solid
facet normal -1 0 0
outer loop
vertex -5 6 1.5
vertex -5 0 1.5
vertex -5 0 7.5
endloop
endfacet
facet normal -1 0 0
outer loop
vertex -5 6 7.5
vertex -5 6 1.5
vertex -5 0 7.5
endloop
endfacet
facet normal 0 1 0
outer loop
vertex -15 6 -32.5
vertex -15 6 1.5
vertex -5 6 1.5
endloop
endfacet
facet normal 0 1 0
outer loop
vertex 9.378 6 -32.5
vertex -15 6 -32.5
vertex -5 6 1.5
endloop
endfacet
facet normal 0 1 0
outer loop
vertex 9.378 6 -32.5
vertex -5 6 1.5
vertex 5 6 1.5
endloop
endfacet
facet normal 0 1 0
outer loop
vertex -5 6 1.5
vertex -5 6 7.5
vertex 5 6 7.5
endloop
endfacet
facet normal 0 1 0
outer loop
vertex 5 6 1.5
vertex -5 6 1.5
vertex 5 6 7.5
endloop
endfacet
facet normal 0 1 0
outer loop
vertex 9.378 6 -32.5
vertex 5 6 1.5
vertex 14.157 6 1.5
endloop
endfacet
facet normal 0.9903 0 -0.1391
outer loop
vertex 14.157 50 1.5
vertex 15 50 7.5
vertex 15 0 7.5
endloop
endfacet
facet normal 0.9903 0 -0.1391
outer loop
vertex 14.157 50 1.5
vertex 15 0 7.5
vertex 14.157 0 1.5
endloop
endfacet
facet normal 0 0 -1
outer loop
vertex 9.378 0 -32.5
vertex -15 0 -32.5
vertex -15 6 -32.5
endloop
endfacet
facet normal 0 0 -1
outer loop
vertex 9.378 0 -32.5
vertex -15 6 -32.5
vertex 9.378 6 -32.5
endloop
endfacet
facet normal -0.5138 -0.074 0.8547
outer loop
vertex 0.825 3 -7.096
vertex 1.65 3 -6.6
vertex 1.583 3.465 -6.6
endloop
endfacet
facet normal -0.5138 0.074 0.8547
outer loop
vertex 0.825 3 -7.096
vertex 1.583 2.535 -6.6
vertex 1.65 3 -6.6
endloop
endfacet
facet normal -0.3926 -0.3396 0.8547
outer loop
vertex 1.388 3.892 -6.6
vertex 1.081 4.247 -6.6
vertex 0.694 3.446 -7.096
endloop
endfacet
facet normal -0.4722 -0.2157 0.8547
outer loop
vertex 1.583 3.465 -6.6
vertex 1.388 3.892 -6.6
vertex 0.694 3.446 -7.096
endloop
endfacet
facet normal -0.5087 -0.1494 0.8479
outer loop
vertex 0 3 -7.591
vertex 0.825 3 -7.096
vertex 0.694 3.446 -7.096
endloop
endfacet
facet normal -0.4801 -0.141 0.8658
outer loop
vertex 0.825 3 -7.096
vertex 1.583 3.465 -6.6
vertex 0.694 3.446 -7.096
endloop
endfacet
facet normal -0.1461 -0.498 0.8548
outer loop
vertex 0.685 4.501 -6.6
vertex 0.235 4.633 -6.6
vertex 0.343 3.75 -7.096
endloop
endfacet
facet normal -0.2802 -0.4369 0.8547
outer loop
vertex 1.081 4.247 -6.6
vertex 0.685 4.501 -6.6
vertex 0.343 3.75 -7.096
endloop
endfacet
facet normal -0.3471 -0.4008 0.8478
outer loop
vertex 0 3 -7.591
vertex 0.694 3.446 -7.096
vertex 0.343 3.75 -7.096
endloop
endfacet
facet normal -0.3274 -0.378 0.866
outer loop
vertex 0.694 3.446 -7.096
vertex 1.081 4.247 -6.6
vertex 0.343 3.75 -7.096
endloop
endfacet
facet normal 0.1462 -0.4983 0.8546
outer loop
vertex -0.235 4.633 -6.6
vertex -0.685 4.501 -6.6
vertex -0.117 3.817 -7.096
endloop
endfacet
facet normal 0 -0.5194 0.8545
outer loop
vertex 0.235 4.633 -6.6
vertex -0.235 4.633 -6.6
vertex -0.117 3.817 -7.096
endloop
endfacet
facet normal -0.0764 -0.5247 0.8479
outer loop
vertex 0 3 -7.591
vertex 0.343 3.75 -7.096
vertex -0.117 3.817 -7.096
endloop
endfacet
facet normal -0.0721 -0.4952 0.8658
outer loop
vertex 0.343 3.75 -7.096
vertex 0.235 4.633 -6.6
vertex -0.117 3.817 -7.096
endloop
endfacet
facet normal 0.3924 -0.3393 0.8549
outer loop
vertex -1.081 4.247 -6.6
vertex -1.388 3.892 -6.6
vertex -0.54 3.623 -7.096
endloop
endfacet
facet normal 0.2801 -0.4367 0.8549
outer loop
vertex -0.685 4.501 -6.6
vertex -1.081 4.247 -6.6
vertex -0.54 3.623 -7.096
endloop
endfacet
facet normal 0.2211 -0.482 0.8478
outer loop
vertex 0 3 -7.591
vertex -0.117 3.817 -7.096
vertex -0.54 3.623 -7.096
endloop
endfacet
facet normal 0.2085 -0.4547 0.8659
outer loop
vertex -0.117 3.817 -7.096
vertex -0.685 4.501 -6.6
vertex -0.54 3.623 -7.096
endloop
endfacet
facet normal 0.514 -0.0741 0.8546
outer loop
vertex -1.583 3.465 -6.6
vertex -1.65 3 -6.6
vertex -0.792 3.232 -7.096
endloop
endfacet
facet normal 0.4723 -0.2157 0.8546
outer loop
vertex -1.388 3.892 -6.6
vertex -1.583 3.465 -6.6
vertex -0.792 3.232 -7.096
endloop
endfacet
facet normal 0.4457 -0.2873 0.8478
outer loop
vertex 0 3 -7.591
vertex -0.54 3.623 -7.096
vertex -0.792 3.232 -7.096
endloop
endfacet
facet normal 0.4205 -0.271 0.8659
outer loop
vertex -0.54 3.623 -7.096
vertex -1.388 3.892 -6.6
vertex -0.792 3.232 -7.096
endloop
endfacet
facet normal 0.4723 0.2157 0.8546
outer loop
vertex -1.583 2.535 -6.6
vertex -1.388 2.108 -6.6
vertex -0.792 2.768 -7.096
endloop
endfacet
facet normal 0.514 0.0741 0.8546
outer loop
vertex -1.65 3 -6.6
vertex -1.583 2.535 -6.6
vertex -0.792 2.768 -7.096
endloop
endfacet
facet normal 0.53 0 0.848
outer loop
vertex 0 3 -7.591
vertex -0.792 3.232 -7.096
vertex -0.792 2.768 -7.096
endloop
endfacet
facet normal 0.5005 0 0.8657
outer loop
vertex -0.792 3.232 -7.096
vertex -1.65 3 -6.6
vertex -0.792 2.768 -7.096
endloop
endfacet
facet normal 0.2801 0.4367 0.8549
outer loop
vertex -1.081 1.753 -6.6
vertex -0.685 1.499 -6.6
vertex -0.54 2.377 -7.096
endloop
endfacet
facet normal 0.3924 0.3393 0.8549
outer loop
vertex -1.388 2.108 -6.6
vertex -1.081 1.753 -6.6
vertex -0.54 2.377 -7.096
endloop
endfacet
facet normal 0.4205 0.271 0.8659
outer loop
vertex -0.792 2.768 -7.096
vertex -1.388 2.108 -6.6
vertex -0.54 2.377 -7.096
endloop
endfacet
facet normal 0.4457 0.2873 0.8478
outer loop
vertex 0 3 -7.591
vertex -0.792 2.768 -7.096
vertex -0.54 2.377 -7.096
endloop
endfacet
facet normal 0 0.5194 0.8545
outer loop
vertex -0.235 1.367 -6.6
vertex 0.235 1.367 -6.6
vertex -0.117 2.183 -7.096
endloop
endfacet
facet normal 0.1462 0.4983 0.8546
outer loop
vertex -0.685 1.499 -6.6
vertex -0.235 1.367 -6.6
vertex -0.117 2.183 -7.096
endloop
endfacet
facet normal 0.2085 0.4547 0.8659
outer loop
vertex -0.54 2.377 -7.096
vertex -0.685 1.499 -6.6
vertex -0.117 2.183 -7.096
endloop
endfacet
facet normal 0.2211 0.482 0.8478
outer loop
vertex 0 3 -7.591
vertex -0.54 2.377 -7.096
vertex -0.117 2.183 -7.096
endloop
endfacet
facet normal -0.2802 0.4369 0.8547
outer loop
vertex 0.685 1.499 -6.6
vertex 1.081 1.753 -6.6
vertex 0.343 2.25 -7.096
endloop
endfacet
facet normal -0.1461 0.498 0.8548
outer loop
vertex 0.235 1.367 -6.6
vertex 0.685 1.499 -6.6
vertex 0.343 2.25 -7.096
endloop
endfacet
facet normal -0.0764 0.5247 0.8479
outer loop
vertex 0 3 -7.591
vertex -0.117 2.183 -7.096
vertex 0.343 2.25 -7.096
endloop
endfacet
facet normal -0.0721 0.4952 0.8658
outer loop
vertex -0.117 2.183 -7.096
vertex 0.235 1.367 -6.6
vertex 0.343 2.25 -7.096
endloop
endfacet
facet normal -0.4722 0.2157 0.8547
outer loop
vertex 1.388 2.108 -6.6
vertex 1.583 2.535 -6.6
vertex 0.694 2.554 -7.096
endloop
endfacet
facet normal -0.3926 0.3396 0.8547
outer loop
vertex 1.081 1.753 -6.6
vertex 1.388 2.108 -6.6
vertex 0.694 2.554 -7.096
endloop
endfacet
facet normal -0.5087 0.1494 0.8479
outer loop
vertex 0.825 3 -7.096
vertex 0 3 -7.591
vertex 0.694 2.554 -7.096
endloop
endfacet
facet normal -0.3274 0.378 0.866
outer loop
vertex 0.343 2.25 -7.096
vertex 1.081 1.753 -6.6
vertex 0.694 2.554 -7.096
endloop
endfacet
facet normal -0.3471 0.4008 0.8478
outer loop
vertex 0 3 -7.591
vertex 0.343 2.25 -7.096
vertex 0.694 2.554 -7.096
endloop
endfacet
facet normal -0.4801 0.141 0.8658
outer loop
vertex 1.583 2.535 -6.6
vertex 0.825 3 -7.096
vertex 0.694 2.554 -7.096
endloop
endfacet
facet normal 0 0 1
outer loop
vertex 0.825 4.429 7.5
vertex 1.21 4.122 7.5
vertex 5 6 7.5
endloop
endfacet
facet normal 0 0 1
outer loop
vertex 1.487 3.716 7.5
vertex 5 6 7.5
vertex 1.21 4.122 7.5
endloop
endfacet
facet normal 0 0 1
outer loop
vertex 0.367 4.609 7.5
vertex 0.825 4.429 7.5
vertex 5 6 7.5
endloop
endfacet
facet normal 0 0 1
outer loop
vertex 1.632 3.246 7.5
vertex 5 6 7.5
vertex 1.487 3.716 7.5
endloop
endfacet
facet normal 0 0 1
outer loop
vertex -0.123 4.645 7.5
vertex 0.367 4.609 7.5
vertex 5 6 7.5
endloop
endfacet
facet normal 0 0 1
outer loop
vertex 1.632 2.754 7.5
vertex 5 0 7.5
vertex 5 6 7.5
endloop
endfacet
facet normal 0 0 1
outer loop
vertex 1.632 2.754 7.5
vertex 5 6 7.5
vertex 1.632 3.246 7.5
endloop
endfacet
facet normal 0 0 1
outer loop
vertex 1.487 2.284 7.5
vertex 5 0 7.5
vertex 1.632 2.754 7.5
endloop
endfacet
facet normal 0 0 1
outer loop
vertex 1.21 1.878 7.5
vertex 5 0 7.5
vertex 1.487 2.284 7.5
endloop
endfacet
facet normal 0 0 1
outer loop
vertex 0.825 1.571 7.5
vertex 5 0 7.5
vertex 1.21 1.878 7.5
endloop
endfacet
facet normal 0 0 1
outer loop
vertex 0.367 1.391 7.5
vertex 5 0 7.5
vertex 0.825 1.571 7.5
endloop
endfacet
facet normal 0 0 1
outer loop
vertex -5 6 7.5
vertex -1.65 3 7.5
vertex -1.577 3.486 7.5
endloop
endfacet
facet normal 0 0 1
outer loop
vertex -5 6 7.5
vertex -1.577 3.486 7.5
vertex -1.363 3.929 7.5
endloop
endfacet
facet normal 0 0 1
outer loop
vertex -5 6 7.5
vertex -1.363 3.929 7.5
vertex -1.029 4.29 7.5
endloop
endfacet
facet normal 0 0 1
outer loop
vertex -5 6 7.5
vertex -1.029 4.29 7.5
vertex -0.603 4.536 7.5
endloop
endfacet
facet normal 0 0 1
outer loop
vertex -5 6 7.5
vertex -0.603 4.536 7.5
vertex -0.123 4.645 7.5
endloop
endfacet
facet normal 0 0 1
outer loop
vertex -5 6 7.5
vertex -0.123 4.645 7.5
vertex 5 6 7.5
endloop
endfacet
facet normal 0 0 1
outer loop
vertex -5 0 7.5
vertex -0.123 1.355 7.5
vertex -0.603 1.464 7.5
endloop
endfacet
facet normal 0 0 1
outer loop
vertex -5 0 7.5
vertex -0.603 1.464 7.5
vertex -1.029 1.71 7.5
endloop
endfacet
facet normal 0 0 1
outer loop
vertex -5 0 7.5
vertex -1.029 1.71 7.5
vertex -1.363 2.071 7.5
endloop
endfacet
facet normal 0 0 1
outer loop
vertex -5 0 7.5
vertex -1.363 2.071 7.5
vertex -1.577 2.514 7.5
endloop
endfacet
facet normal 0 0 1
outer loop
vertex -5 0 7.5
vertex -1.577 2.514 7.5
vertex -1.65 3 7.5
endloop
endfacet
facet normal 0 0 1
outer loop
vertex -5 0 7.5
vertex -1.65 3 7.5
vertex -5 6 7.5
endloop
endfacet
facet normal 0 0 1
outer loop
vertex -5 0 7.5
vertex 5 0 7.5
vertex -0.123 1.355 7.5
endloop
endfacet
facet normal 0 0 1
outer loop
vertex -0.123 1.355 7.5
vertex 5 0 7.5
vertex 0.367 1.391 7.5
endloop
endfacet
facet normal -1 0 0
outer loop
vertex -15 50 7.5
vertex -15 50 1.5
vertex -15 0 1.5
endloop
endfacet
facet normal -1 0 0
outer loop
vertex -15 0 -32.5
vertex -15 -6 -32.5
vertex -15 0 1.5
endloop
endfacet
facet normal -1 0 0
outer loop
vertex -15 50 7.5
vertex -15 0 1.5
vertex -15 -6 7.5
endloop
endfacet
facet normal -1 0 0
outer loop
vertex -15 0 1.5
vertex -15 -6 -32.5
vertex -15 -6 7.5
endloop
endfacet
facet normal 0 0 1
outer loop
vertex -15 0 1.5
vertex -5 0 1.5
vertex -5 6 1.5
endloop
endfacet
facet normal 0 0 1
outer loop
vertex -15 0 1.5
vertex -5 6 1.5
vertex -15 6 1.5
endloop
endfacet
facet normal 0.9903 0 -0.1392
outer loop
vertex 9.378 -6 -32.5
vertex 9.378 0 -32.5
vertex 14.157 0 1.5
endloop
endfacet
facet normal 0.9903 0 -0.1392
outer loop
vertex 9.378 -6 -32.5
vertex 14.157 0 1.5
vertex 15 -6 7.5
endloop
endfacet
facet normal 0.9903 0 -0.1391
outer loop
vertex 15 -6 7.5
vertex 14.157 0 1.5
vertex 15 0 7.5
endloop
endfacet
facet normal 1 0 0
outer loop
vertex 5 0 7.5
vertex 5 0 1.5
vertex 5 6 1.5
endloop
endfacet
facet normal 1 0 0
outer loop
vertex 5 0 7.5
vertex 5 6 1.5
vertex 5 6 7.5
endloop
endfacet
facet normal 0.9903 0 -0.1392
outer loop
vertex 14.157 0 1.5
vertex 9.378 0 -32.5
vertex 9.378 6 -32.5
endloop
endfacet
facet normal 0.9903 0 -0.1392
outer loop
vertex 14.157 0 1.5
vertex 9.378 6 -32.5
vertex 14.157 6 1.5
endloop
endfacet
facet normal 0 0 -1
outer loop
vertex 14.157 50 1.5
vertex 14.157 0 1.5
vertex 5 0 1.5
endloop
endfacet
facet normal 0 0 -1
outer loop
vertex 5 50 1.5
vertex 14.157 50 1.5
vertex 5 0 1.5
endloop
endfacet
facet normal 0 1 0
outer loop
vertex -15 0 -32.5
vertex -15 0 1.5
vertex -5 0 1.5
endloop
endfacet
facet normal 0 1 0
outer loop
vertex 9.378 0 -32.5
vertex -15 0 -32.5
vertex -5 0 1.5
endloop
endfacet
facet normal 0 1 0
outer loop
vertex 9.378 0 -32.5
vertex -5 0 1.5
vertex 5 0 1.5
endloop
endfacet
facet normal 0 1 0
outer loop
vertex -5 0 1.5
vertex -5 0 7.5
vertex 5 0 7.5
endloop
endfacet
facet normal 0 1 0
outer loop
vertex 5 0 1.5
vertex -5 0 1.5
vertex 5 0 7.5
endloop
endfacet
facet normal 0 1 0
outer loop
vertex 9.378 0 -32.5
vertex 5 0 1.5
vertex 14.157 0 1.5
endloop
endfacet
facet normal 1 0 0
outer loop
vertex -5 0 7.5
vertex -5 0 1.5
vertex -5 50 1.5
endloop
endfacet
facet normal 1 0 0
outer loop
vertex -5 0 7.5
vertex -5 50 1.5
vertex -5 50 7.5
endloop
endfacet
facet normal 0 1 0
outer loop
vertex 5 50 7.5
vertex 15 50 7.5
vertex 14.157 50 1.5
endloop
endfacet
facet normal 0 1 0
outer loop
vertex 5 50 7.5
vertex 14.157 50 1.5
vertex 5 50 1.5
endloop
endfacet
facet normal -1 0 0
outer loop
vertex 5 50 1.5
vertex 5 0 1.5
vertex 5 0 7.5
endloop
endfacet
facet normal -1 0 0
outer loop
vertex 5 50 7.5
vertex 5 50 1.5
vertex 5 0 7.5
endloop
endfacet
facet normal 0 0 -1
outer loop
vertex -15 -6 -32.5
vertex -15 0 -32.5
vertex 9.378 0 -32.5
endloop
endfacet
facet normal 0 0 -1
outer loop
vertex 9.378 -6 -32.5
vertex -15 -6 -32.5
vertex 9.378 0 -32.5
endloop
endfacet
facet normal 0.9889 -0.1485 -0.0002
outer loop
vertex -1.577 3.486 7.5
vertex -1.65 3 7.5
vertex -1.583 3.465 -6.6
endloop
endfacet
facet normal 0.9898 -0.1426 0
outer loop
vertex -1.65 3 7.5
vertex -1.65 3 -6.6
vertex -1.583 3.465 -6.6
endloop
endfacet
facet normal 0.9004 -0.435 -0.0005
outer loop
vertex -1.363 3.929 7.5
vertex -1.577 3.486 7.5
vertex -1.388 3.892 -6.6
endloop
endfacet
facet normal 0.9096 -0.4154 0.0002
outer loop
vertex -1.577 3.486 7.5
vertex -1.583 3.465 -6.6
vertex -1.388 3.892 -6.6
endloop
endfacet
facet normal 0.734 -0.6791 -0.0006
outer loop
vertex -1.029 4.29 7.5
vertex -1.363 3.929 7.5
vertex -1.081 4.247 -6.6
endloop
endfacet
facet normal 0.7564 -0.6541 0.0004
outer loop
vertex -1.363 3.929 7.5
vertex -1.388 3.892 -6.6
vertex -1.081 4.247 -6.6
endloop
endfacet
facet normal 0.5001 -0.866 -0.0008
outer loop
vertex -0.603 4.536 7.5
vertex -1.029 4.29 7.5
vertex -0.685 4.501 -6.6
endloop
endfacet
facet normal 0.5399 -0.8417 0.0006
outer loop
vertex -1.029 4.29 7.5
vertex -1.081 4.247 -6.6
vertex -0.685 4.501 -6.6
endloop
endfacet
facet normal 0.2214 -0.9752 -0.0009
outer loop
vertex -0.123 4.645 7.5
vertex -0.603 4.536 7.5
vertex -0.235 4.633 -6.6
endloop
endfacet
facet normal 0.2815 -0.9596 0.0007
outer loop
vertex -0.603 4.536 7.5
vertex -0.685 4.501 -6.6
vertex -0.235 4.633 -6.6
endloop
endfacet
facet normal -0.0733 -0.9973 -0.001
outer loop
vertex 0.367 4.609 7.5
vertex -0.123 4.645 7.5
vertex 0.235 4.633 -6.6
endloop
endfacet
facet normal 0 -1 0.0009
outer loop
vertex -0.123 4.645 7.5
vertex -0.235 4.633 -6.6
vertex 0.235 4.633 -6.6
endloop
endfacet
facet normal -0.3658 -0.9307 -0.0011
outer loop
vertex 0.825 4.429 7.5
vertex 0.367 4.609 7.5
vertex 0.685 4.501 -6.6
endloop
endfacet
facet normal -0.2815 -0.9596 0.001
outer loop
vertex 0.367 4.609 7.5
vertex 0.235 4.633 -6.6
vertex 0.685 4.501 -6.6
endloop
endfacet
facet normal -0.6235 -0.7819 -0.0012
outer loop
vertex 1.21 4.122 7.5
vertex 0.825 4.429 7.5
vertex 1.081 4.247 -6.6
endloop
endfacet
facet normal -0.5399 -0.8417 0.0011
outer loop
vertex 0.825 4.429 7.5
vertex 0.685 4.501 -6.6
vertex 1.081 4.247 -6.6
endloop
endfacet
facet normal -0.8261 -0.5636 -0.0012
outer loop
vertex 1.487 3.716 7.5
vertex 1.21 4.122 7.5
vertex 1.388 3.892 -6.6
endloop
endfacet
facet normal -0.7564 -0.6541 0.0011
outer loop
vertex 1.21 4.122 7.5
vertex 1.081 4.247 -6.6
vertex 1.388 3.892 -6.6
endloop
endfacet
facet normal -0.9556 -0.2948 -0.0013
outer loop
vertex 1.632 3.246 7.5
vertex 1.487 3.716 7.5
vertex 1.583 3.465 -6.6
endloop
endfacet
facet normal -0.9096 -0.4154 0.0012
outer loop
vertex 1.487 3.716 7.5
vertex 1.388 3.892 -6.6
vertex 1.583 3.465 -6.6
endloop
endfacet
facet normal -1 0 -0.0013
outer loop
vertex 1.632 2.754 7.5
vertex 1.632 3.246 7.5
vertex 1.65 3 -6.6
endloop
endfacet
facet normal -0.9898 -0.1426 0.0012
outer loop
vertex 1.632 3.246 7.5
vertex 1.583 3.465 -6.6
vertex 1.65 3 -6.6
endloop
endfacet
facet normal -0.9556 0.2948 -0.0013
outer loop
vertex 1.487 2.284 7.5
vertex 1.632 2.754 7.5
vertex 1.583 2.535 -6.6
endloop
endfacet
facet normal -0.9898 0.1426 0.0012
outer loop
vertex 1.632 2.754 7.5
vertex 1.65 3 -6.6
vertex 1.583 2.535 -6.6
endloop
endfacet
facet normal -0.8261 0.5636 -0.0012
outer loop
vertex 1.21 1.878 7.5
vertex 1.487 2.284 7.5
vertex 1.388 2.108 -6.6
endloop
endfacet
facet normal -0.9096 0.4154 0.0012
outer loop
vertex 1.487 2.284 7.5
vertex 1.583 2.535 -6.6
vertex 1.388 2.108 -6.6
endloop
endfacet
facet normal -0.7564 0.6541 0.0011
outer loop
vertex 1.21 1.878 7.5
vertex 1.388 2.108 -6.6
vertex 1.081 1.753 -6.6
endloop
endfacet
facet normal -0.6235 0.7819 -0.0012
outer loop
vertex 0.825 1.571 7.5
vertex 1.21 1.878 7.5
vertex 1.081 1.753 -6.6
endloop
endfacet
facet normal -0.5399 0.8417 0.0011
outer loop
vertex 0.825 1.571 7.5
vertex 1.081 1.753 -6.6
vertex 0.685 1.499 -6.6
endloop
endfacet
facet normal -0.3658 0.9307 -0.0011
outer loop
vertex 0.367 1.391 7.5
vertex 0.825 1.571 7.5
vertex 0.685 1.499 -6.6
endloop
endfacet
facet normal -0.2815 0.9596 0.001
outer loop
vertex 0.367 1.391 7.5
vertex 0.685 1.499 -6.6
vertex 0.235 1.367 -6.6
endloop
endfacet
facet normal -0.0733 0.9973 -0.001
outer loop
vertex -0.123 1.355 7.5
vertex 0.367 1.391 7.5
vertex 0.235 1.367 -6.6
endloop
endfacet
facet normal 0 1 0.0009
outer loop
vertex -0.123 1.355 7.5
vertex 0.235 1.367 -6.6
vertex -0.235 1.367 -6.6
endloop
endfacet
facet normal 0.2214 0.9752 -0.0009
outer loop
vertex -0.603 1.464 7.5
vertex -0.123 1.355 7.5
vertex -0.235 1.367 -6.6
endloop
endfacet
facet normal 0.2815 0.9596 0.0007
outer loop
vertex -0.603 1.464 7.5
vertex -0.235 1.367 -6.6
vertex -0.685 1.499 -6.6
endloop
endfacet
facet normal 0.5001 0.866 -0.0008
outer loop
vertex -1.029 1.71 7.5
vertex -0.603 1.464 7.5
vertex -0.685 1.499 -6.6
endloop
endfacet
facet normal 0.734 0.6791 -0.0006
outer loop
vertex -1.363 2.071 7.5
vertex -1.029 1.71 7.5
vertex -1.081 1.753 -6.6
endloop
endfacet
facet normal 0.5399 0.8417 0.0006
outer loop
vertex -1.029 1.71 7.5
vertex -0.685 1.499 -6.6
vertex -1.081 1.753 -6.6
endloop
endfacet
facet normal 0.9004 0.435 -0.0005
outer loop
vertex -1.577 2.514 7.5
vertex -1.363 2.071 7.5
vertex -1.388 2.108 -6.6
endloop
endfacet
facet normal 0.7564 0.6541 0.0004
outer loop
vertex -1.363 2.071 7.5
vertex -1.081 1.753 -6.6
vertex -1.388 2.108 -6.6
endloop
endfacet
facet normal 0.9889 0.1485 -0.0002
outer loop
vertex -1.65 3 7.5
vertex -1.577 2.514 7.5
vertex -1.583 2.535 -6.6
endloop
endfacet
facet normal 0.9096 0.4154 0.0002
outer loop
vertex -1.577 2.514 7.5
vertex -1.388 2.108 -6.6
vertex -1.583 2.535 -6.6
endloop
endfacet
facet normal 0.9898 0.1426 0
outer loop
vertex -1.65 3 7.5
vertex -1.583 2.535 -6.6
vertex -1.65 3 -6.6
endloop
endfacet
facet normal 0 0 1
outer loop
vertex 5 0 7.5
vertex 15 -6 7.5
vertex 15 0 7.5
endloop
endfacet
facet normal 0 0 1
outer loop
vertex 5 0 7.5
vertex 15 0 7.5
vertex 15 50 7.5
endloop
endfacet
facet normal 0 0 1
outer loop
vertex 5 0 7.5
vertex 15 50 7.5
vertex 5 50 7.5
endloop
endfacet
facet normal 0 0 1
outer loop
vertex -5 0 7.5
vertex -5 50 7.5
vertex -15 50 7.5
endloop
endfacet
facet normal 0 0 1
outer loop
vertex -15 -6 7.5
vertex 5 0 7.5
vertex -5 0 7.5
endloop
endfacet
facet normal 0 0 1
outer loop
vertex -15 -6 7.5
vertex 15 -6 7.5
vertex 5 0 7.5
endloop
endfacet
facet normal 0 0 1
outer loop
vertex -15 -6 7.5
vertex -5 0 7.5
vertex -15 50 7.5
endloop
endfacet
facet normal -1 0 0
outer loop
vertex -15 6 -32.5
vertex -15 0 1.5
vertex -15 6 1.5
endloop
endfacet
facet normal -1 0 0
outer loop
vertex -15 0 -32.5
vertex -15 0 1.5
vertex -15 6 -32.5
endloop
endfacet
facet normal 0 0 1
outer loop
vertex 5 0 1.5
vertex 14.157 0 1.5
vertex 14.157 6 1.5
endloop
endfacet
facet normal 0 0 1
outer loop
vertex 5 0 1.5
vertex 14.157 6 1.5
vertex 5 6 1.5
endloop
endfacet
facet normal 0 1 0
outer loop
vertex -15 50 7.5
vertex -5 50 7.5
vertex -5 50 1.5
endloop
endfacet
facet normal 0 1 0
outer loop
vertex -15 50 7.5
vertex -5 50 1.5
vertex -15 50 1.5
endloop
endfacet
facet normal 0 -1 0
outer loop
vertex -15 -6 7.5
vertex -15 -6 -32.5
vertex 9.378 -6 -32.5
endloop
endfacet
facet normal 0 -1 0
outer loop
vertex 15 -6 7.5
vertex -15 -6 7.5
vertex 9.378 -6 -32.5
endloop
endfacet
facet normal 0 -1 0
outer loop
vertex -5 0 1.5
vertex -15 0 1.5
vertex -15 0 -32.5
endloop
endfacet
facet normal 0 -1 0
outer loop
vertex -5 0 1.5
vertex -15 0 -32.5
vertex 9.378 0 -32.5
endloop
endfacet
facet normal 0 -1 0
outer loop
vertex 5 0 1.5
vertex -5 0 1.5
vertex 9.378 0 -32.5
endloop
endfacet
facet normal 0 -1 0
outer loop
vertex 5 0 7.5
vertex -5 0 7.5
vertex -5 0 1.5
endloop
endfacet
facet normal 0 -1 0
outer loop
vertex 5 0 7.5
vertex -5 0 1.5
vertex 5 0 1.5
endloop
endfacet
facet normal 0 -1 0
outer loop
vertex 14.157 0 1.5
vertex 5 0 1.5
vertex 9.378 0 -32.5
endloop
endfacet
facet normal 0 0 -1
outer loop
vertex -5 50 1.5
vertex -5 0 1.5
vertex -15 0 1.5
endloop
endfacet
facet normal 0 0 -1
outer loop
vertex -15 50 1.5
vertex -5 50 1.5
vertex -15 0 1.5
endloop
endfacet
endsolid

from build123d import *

# Parameters (mm, degrees)
F1_DEPTH = 6
F2_W     = 10
F2_H     = 6
F3_DEPTH = 50
F4_DEPTH = 6
F6_D     = 3.3
F6_DEPTH = 14.1
F6_TIP   = 0.9914200214


with BuildPart() as f1:
    # F0 (on Front) → F1 (new body)
    with BuildSketch(Plane.XZ):
        Polygon((-15, 7.5), (-15, -32.5), (9.3783666119, -32.5), (15, 7.5), align=None)
    extrude(amount=F1_DEPTH)

    # F2 (on face) → F3 (join)
    with BuildSketch(Plane(origin=(0, 0, 0), x_dir=(-1, 0, 0), z_dir=(0, 1, 0))):
        with Locations((10, 4.5)):
            Rectangle(F2_W, F2_H)
        Polygon((-5, 1.5), (-5, 7.5), (-15, 7.5), (-14.1567549918, 1.5), align=None)
    extrude(amount=F3_DEPTH)


with BuildPart() as f4:
    # F4 (new): a face of the model
    f4_faces = [f1.part.faces().sort_by_distance(p)[0] for p in [
        (-1.4829134342, 0, -13.788503144),
    ]]
    extrude(f4_faces, amount=F4_DEPTH)

    # F6
    with Locations(Plane.XY.offset(7.5)):
        with Locations((0, 3)):
            Hole(F6_D / 2, depth=F6_DEPTH)
            with Locations((0, 0, -(F6_DEPTH + F6_TIP / 2))):  # 118° drill point
                Cone(0, F6_D / 2, F6_TIP, mode=Mode.SUBTRACT)


solid = Compound([f1.part, f4.part])
